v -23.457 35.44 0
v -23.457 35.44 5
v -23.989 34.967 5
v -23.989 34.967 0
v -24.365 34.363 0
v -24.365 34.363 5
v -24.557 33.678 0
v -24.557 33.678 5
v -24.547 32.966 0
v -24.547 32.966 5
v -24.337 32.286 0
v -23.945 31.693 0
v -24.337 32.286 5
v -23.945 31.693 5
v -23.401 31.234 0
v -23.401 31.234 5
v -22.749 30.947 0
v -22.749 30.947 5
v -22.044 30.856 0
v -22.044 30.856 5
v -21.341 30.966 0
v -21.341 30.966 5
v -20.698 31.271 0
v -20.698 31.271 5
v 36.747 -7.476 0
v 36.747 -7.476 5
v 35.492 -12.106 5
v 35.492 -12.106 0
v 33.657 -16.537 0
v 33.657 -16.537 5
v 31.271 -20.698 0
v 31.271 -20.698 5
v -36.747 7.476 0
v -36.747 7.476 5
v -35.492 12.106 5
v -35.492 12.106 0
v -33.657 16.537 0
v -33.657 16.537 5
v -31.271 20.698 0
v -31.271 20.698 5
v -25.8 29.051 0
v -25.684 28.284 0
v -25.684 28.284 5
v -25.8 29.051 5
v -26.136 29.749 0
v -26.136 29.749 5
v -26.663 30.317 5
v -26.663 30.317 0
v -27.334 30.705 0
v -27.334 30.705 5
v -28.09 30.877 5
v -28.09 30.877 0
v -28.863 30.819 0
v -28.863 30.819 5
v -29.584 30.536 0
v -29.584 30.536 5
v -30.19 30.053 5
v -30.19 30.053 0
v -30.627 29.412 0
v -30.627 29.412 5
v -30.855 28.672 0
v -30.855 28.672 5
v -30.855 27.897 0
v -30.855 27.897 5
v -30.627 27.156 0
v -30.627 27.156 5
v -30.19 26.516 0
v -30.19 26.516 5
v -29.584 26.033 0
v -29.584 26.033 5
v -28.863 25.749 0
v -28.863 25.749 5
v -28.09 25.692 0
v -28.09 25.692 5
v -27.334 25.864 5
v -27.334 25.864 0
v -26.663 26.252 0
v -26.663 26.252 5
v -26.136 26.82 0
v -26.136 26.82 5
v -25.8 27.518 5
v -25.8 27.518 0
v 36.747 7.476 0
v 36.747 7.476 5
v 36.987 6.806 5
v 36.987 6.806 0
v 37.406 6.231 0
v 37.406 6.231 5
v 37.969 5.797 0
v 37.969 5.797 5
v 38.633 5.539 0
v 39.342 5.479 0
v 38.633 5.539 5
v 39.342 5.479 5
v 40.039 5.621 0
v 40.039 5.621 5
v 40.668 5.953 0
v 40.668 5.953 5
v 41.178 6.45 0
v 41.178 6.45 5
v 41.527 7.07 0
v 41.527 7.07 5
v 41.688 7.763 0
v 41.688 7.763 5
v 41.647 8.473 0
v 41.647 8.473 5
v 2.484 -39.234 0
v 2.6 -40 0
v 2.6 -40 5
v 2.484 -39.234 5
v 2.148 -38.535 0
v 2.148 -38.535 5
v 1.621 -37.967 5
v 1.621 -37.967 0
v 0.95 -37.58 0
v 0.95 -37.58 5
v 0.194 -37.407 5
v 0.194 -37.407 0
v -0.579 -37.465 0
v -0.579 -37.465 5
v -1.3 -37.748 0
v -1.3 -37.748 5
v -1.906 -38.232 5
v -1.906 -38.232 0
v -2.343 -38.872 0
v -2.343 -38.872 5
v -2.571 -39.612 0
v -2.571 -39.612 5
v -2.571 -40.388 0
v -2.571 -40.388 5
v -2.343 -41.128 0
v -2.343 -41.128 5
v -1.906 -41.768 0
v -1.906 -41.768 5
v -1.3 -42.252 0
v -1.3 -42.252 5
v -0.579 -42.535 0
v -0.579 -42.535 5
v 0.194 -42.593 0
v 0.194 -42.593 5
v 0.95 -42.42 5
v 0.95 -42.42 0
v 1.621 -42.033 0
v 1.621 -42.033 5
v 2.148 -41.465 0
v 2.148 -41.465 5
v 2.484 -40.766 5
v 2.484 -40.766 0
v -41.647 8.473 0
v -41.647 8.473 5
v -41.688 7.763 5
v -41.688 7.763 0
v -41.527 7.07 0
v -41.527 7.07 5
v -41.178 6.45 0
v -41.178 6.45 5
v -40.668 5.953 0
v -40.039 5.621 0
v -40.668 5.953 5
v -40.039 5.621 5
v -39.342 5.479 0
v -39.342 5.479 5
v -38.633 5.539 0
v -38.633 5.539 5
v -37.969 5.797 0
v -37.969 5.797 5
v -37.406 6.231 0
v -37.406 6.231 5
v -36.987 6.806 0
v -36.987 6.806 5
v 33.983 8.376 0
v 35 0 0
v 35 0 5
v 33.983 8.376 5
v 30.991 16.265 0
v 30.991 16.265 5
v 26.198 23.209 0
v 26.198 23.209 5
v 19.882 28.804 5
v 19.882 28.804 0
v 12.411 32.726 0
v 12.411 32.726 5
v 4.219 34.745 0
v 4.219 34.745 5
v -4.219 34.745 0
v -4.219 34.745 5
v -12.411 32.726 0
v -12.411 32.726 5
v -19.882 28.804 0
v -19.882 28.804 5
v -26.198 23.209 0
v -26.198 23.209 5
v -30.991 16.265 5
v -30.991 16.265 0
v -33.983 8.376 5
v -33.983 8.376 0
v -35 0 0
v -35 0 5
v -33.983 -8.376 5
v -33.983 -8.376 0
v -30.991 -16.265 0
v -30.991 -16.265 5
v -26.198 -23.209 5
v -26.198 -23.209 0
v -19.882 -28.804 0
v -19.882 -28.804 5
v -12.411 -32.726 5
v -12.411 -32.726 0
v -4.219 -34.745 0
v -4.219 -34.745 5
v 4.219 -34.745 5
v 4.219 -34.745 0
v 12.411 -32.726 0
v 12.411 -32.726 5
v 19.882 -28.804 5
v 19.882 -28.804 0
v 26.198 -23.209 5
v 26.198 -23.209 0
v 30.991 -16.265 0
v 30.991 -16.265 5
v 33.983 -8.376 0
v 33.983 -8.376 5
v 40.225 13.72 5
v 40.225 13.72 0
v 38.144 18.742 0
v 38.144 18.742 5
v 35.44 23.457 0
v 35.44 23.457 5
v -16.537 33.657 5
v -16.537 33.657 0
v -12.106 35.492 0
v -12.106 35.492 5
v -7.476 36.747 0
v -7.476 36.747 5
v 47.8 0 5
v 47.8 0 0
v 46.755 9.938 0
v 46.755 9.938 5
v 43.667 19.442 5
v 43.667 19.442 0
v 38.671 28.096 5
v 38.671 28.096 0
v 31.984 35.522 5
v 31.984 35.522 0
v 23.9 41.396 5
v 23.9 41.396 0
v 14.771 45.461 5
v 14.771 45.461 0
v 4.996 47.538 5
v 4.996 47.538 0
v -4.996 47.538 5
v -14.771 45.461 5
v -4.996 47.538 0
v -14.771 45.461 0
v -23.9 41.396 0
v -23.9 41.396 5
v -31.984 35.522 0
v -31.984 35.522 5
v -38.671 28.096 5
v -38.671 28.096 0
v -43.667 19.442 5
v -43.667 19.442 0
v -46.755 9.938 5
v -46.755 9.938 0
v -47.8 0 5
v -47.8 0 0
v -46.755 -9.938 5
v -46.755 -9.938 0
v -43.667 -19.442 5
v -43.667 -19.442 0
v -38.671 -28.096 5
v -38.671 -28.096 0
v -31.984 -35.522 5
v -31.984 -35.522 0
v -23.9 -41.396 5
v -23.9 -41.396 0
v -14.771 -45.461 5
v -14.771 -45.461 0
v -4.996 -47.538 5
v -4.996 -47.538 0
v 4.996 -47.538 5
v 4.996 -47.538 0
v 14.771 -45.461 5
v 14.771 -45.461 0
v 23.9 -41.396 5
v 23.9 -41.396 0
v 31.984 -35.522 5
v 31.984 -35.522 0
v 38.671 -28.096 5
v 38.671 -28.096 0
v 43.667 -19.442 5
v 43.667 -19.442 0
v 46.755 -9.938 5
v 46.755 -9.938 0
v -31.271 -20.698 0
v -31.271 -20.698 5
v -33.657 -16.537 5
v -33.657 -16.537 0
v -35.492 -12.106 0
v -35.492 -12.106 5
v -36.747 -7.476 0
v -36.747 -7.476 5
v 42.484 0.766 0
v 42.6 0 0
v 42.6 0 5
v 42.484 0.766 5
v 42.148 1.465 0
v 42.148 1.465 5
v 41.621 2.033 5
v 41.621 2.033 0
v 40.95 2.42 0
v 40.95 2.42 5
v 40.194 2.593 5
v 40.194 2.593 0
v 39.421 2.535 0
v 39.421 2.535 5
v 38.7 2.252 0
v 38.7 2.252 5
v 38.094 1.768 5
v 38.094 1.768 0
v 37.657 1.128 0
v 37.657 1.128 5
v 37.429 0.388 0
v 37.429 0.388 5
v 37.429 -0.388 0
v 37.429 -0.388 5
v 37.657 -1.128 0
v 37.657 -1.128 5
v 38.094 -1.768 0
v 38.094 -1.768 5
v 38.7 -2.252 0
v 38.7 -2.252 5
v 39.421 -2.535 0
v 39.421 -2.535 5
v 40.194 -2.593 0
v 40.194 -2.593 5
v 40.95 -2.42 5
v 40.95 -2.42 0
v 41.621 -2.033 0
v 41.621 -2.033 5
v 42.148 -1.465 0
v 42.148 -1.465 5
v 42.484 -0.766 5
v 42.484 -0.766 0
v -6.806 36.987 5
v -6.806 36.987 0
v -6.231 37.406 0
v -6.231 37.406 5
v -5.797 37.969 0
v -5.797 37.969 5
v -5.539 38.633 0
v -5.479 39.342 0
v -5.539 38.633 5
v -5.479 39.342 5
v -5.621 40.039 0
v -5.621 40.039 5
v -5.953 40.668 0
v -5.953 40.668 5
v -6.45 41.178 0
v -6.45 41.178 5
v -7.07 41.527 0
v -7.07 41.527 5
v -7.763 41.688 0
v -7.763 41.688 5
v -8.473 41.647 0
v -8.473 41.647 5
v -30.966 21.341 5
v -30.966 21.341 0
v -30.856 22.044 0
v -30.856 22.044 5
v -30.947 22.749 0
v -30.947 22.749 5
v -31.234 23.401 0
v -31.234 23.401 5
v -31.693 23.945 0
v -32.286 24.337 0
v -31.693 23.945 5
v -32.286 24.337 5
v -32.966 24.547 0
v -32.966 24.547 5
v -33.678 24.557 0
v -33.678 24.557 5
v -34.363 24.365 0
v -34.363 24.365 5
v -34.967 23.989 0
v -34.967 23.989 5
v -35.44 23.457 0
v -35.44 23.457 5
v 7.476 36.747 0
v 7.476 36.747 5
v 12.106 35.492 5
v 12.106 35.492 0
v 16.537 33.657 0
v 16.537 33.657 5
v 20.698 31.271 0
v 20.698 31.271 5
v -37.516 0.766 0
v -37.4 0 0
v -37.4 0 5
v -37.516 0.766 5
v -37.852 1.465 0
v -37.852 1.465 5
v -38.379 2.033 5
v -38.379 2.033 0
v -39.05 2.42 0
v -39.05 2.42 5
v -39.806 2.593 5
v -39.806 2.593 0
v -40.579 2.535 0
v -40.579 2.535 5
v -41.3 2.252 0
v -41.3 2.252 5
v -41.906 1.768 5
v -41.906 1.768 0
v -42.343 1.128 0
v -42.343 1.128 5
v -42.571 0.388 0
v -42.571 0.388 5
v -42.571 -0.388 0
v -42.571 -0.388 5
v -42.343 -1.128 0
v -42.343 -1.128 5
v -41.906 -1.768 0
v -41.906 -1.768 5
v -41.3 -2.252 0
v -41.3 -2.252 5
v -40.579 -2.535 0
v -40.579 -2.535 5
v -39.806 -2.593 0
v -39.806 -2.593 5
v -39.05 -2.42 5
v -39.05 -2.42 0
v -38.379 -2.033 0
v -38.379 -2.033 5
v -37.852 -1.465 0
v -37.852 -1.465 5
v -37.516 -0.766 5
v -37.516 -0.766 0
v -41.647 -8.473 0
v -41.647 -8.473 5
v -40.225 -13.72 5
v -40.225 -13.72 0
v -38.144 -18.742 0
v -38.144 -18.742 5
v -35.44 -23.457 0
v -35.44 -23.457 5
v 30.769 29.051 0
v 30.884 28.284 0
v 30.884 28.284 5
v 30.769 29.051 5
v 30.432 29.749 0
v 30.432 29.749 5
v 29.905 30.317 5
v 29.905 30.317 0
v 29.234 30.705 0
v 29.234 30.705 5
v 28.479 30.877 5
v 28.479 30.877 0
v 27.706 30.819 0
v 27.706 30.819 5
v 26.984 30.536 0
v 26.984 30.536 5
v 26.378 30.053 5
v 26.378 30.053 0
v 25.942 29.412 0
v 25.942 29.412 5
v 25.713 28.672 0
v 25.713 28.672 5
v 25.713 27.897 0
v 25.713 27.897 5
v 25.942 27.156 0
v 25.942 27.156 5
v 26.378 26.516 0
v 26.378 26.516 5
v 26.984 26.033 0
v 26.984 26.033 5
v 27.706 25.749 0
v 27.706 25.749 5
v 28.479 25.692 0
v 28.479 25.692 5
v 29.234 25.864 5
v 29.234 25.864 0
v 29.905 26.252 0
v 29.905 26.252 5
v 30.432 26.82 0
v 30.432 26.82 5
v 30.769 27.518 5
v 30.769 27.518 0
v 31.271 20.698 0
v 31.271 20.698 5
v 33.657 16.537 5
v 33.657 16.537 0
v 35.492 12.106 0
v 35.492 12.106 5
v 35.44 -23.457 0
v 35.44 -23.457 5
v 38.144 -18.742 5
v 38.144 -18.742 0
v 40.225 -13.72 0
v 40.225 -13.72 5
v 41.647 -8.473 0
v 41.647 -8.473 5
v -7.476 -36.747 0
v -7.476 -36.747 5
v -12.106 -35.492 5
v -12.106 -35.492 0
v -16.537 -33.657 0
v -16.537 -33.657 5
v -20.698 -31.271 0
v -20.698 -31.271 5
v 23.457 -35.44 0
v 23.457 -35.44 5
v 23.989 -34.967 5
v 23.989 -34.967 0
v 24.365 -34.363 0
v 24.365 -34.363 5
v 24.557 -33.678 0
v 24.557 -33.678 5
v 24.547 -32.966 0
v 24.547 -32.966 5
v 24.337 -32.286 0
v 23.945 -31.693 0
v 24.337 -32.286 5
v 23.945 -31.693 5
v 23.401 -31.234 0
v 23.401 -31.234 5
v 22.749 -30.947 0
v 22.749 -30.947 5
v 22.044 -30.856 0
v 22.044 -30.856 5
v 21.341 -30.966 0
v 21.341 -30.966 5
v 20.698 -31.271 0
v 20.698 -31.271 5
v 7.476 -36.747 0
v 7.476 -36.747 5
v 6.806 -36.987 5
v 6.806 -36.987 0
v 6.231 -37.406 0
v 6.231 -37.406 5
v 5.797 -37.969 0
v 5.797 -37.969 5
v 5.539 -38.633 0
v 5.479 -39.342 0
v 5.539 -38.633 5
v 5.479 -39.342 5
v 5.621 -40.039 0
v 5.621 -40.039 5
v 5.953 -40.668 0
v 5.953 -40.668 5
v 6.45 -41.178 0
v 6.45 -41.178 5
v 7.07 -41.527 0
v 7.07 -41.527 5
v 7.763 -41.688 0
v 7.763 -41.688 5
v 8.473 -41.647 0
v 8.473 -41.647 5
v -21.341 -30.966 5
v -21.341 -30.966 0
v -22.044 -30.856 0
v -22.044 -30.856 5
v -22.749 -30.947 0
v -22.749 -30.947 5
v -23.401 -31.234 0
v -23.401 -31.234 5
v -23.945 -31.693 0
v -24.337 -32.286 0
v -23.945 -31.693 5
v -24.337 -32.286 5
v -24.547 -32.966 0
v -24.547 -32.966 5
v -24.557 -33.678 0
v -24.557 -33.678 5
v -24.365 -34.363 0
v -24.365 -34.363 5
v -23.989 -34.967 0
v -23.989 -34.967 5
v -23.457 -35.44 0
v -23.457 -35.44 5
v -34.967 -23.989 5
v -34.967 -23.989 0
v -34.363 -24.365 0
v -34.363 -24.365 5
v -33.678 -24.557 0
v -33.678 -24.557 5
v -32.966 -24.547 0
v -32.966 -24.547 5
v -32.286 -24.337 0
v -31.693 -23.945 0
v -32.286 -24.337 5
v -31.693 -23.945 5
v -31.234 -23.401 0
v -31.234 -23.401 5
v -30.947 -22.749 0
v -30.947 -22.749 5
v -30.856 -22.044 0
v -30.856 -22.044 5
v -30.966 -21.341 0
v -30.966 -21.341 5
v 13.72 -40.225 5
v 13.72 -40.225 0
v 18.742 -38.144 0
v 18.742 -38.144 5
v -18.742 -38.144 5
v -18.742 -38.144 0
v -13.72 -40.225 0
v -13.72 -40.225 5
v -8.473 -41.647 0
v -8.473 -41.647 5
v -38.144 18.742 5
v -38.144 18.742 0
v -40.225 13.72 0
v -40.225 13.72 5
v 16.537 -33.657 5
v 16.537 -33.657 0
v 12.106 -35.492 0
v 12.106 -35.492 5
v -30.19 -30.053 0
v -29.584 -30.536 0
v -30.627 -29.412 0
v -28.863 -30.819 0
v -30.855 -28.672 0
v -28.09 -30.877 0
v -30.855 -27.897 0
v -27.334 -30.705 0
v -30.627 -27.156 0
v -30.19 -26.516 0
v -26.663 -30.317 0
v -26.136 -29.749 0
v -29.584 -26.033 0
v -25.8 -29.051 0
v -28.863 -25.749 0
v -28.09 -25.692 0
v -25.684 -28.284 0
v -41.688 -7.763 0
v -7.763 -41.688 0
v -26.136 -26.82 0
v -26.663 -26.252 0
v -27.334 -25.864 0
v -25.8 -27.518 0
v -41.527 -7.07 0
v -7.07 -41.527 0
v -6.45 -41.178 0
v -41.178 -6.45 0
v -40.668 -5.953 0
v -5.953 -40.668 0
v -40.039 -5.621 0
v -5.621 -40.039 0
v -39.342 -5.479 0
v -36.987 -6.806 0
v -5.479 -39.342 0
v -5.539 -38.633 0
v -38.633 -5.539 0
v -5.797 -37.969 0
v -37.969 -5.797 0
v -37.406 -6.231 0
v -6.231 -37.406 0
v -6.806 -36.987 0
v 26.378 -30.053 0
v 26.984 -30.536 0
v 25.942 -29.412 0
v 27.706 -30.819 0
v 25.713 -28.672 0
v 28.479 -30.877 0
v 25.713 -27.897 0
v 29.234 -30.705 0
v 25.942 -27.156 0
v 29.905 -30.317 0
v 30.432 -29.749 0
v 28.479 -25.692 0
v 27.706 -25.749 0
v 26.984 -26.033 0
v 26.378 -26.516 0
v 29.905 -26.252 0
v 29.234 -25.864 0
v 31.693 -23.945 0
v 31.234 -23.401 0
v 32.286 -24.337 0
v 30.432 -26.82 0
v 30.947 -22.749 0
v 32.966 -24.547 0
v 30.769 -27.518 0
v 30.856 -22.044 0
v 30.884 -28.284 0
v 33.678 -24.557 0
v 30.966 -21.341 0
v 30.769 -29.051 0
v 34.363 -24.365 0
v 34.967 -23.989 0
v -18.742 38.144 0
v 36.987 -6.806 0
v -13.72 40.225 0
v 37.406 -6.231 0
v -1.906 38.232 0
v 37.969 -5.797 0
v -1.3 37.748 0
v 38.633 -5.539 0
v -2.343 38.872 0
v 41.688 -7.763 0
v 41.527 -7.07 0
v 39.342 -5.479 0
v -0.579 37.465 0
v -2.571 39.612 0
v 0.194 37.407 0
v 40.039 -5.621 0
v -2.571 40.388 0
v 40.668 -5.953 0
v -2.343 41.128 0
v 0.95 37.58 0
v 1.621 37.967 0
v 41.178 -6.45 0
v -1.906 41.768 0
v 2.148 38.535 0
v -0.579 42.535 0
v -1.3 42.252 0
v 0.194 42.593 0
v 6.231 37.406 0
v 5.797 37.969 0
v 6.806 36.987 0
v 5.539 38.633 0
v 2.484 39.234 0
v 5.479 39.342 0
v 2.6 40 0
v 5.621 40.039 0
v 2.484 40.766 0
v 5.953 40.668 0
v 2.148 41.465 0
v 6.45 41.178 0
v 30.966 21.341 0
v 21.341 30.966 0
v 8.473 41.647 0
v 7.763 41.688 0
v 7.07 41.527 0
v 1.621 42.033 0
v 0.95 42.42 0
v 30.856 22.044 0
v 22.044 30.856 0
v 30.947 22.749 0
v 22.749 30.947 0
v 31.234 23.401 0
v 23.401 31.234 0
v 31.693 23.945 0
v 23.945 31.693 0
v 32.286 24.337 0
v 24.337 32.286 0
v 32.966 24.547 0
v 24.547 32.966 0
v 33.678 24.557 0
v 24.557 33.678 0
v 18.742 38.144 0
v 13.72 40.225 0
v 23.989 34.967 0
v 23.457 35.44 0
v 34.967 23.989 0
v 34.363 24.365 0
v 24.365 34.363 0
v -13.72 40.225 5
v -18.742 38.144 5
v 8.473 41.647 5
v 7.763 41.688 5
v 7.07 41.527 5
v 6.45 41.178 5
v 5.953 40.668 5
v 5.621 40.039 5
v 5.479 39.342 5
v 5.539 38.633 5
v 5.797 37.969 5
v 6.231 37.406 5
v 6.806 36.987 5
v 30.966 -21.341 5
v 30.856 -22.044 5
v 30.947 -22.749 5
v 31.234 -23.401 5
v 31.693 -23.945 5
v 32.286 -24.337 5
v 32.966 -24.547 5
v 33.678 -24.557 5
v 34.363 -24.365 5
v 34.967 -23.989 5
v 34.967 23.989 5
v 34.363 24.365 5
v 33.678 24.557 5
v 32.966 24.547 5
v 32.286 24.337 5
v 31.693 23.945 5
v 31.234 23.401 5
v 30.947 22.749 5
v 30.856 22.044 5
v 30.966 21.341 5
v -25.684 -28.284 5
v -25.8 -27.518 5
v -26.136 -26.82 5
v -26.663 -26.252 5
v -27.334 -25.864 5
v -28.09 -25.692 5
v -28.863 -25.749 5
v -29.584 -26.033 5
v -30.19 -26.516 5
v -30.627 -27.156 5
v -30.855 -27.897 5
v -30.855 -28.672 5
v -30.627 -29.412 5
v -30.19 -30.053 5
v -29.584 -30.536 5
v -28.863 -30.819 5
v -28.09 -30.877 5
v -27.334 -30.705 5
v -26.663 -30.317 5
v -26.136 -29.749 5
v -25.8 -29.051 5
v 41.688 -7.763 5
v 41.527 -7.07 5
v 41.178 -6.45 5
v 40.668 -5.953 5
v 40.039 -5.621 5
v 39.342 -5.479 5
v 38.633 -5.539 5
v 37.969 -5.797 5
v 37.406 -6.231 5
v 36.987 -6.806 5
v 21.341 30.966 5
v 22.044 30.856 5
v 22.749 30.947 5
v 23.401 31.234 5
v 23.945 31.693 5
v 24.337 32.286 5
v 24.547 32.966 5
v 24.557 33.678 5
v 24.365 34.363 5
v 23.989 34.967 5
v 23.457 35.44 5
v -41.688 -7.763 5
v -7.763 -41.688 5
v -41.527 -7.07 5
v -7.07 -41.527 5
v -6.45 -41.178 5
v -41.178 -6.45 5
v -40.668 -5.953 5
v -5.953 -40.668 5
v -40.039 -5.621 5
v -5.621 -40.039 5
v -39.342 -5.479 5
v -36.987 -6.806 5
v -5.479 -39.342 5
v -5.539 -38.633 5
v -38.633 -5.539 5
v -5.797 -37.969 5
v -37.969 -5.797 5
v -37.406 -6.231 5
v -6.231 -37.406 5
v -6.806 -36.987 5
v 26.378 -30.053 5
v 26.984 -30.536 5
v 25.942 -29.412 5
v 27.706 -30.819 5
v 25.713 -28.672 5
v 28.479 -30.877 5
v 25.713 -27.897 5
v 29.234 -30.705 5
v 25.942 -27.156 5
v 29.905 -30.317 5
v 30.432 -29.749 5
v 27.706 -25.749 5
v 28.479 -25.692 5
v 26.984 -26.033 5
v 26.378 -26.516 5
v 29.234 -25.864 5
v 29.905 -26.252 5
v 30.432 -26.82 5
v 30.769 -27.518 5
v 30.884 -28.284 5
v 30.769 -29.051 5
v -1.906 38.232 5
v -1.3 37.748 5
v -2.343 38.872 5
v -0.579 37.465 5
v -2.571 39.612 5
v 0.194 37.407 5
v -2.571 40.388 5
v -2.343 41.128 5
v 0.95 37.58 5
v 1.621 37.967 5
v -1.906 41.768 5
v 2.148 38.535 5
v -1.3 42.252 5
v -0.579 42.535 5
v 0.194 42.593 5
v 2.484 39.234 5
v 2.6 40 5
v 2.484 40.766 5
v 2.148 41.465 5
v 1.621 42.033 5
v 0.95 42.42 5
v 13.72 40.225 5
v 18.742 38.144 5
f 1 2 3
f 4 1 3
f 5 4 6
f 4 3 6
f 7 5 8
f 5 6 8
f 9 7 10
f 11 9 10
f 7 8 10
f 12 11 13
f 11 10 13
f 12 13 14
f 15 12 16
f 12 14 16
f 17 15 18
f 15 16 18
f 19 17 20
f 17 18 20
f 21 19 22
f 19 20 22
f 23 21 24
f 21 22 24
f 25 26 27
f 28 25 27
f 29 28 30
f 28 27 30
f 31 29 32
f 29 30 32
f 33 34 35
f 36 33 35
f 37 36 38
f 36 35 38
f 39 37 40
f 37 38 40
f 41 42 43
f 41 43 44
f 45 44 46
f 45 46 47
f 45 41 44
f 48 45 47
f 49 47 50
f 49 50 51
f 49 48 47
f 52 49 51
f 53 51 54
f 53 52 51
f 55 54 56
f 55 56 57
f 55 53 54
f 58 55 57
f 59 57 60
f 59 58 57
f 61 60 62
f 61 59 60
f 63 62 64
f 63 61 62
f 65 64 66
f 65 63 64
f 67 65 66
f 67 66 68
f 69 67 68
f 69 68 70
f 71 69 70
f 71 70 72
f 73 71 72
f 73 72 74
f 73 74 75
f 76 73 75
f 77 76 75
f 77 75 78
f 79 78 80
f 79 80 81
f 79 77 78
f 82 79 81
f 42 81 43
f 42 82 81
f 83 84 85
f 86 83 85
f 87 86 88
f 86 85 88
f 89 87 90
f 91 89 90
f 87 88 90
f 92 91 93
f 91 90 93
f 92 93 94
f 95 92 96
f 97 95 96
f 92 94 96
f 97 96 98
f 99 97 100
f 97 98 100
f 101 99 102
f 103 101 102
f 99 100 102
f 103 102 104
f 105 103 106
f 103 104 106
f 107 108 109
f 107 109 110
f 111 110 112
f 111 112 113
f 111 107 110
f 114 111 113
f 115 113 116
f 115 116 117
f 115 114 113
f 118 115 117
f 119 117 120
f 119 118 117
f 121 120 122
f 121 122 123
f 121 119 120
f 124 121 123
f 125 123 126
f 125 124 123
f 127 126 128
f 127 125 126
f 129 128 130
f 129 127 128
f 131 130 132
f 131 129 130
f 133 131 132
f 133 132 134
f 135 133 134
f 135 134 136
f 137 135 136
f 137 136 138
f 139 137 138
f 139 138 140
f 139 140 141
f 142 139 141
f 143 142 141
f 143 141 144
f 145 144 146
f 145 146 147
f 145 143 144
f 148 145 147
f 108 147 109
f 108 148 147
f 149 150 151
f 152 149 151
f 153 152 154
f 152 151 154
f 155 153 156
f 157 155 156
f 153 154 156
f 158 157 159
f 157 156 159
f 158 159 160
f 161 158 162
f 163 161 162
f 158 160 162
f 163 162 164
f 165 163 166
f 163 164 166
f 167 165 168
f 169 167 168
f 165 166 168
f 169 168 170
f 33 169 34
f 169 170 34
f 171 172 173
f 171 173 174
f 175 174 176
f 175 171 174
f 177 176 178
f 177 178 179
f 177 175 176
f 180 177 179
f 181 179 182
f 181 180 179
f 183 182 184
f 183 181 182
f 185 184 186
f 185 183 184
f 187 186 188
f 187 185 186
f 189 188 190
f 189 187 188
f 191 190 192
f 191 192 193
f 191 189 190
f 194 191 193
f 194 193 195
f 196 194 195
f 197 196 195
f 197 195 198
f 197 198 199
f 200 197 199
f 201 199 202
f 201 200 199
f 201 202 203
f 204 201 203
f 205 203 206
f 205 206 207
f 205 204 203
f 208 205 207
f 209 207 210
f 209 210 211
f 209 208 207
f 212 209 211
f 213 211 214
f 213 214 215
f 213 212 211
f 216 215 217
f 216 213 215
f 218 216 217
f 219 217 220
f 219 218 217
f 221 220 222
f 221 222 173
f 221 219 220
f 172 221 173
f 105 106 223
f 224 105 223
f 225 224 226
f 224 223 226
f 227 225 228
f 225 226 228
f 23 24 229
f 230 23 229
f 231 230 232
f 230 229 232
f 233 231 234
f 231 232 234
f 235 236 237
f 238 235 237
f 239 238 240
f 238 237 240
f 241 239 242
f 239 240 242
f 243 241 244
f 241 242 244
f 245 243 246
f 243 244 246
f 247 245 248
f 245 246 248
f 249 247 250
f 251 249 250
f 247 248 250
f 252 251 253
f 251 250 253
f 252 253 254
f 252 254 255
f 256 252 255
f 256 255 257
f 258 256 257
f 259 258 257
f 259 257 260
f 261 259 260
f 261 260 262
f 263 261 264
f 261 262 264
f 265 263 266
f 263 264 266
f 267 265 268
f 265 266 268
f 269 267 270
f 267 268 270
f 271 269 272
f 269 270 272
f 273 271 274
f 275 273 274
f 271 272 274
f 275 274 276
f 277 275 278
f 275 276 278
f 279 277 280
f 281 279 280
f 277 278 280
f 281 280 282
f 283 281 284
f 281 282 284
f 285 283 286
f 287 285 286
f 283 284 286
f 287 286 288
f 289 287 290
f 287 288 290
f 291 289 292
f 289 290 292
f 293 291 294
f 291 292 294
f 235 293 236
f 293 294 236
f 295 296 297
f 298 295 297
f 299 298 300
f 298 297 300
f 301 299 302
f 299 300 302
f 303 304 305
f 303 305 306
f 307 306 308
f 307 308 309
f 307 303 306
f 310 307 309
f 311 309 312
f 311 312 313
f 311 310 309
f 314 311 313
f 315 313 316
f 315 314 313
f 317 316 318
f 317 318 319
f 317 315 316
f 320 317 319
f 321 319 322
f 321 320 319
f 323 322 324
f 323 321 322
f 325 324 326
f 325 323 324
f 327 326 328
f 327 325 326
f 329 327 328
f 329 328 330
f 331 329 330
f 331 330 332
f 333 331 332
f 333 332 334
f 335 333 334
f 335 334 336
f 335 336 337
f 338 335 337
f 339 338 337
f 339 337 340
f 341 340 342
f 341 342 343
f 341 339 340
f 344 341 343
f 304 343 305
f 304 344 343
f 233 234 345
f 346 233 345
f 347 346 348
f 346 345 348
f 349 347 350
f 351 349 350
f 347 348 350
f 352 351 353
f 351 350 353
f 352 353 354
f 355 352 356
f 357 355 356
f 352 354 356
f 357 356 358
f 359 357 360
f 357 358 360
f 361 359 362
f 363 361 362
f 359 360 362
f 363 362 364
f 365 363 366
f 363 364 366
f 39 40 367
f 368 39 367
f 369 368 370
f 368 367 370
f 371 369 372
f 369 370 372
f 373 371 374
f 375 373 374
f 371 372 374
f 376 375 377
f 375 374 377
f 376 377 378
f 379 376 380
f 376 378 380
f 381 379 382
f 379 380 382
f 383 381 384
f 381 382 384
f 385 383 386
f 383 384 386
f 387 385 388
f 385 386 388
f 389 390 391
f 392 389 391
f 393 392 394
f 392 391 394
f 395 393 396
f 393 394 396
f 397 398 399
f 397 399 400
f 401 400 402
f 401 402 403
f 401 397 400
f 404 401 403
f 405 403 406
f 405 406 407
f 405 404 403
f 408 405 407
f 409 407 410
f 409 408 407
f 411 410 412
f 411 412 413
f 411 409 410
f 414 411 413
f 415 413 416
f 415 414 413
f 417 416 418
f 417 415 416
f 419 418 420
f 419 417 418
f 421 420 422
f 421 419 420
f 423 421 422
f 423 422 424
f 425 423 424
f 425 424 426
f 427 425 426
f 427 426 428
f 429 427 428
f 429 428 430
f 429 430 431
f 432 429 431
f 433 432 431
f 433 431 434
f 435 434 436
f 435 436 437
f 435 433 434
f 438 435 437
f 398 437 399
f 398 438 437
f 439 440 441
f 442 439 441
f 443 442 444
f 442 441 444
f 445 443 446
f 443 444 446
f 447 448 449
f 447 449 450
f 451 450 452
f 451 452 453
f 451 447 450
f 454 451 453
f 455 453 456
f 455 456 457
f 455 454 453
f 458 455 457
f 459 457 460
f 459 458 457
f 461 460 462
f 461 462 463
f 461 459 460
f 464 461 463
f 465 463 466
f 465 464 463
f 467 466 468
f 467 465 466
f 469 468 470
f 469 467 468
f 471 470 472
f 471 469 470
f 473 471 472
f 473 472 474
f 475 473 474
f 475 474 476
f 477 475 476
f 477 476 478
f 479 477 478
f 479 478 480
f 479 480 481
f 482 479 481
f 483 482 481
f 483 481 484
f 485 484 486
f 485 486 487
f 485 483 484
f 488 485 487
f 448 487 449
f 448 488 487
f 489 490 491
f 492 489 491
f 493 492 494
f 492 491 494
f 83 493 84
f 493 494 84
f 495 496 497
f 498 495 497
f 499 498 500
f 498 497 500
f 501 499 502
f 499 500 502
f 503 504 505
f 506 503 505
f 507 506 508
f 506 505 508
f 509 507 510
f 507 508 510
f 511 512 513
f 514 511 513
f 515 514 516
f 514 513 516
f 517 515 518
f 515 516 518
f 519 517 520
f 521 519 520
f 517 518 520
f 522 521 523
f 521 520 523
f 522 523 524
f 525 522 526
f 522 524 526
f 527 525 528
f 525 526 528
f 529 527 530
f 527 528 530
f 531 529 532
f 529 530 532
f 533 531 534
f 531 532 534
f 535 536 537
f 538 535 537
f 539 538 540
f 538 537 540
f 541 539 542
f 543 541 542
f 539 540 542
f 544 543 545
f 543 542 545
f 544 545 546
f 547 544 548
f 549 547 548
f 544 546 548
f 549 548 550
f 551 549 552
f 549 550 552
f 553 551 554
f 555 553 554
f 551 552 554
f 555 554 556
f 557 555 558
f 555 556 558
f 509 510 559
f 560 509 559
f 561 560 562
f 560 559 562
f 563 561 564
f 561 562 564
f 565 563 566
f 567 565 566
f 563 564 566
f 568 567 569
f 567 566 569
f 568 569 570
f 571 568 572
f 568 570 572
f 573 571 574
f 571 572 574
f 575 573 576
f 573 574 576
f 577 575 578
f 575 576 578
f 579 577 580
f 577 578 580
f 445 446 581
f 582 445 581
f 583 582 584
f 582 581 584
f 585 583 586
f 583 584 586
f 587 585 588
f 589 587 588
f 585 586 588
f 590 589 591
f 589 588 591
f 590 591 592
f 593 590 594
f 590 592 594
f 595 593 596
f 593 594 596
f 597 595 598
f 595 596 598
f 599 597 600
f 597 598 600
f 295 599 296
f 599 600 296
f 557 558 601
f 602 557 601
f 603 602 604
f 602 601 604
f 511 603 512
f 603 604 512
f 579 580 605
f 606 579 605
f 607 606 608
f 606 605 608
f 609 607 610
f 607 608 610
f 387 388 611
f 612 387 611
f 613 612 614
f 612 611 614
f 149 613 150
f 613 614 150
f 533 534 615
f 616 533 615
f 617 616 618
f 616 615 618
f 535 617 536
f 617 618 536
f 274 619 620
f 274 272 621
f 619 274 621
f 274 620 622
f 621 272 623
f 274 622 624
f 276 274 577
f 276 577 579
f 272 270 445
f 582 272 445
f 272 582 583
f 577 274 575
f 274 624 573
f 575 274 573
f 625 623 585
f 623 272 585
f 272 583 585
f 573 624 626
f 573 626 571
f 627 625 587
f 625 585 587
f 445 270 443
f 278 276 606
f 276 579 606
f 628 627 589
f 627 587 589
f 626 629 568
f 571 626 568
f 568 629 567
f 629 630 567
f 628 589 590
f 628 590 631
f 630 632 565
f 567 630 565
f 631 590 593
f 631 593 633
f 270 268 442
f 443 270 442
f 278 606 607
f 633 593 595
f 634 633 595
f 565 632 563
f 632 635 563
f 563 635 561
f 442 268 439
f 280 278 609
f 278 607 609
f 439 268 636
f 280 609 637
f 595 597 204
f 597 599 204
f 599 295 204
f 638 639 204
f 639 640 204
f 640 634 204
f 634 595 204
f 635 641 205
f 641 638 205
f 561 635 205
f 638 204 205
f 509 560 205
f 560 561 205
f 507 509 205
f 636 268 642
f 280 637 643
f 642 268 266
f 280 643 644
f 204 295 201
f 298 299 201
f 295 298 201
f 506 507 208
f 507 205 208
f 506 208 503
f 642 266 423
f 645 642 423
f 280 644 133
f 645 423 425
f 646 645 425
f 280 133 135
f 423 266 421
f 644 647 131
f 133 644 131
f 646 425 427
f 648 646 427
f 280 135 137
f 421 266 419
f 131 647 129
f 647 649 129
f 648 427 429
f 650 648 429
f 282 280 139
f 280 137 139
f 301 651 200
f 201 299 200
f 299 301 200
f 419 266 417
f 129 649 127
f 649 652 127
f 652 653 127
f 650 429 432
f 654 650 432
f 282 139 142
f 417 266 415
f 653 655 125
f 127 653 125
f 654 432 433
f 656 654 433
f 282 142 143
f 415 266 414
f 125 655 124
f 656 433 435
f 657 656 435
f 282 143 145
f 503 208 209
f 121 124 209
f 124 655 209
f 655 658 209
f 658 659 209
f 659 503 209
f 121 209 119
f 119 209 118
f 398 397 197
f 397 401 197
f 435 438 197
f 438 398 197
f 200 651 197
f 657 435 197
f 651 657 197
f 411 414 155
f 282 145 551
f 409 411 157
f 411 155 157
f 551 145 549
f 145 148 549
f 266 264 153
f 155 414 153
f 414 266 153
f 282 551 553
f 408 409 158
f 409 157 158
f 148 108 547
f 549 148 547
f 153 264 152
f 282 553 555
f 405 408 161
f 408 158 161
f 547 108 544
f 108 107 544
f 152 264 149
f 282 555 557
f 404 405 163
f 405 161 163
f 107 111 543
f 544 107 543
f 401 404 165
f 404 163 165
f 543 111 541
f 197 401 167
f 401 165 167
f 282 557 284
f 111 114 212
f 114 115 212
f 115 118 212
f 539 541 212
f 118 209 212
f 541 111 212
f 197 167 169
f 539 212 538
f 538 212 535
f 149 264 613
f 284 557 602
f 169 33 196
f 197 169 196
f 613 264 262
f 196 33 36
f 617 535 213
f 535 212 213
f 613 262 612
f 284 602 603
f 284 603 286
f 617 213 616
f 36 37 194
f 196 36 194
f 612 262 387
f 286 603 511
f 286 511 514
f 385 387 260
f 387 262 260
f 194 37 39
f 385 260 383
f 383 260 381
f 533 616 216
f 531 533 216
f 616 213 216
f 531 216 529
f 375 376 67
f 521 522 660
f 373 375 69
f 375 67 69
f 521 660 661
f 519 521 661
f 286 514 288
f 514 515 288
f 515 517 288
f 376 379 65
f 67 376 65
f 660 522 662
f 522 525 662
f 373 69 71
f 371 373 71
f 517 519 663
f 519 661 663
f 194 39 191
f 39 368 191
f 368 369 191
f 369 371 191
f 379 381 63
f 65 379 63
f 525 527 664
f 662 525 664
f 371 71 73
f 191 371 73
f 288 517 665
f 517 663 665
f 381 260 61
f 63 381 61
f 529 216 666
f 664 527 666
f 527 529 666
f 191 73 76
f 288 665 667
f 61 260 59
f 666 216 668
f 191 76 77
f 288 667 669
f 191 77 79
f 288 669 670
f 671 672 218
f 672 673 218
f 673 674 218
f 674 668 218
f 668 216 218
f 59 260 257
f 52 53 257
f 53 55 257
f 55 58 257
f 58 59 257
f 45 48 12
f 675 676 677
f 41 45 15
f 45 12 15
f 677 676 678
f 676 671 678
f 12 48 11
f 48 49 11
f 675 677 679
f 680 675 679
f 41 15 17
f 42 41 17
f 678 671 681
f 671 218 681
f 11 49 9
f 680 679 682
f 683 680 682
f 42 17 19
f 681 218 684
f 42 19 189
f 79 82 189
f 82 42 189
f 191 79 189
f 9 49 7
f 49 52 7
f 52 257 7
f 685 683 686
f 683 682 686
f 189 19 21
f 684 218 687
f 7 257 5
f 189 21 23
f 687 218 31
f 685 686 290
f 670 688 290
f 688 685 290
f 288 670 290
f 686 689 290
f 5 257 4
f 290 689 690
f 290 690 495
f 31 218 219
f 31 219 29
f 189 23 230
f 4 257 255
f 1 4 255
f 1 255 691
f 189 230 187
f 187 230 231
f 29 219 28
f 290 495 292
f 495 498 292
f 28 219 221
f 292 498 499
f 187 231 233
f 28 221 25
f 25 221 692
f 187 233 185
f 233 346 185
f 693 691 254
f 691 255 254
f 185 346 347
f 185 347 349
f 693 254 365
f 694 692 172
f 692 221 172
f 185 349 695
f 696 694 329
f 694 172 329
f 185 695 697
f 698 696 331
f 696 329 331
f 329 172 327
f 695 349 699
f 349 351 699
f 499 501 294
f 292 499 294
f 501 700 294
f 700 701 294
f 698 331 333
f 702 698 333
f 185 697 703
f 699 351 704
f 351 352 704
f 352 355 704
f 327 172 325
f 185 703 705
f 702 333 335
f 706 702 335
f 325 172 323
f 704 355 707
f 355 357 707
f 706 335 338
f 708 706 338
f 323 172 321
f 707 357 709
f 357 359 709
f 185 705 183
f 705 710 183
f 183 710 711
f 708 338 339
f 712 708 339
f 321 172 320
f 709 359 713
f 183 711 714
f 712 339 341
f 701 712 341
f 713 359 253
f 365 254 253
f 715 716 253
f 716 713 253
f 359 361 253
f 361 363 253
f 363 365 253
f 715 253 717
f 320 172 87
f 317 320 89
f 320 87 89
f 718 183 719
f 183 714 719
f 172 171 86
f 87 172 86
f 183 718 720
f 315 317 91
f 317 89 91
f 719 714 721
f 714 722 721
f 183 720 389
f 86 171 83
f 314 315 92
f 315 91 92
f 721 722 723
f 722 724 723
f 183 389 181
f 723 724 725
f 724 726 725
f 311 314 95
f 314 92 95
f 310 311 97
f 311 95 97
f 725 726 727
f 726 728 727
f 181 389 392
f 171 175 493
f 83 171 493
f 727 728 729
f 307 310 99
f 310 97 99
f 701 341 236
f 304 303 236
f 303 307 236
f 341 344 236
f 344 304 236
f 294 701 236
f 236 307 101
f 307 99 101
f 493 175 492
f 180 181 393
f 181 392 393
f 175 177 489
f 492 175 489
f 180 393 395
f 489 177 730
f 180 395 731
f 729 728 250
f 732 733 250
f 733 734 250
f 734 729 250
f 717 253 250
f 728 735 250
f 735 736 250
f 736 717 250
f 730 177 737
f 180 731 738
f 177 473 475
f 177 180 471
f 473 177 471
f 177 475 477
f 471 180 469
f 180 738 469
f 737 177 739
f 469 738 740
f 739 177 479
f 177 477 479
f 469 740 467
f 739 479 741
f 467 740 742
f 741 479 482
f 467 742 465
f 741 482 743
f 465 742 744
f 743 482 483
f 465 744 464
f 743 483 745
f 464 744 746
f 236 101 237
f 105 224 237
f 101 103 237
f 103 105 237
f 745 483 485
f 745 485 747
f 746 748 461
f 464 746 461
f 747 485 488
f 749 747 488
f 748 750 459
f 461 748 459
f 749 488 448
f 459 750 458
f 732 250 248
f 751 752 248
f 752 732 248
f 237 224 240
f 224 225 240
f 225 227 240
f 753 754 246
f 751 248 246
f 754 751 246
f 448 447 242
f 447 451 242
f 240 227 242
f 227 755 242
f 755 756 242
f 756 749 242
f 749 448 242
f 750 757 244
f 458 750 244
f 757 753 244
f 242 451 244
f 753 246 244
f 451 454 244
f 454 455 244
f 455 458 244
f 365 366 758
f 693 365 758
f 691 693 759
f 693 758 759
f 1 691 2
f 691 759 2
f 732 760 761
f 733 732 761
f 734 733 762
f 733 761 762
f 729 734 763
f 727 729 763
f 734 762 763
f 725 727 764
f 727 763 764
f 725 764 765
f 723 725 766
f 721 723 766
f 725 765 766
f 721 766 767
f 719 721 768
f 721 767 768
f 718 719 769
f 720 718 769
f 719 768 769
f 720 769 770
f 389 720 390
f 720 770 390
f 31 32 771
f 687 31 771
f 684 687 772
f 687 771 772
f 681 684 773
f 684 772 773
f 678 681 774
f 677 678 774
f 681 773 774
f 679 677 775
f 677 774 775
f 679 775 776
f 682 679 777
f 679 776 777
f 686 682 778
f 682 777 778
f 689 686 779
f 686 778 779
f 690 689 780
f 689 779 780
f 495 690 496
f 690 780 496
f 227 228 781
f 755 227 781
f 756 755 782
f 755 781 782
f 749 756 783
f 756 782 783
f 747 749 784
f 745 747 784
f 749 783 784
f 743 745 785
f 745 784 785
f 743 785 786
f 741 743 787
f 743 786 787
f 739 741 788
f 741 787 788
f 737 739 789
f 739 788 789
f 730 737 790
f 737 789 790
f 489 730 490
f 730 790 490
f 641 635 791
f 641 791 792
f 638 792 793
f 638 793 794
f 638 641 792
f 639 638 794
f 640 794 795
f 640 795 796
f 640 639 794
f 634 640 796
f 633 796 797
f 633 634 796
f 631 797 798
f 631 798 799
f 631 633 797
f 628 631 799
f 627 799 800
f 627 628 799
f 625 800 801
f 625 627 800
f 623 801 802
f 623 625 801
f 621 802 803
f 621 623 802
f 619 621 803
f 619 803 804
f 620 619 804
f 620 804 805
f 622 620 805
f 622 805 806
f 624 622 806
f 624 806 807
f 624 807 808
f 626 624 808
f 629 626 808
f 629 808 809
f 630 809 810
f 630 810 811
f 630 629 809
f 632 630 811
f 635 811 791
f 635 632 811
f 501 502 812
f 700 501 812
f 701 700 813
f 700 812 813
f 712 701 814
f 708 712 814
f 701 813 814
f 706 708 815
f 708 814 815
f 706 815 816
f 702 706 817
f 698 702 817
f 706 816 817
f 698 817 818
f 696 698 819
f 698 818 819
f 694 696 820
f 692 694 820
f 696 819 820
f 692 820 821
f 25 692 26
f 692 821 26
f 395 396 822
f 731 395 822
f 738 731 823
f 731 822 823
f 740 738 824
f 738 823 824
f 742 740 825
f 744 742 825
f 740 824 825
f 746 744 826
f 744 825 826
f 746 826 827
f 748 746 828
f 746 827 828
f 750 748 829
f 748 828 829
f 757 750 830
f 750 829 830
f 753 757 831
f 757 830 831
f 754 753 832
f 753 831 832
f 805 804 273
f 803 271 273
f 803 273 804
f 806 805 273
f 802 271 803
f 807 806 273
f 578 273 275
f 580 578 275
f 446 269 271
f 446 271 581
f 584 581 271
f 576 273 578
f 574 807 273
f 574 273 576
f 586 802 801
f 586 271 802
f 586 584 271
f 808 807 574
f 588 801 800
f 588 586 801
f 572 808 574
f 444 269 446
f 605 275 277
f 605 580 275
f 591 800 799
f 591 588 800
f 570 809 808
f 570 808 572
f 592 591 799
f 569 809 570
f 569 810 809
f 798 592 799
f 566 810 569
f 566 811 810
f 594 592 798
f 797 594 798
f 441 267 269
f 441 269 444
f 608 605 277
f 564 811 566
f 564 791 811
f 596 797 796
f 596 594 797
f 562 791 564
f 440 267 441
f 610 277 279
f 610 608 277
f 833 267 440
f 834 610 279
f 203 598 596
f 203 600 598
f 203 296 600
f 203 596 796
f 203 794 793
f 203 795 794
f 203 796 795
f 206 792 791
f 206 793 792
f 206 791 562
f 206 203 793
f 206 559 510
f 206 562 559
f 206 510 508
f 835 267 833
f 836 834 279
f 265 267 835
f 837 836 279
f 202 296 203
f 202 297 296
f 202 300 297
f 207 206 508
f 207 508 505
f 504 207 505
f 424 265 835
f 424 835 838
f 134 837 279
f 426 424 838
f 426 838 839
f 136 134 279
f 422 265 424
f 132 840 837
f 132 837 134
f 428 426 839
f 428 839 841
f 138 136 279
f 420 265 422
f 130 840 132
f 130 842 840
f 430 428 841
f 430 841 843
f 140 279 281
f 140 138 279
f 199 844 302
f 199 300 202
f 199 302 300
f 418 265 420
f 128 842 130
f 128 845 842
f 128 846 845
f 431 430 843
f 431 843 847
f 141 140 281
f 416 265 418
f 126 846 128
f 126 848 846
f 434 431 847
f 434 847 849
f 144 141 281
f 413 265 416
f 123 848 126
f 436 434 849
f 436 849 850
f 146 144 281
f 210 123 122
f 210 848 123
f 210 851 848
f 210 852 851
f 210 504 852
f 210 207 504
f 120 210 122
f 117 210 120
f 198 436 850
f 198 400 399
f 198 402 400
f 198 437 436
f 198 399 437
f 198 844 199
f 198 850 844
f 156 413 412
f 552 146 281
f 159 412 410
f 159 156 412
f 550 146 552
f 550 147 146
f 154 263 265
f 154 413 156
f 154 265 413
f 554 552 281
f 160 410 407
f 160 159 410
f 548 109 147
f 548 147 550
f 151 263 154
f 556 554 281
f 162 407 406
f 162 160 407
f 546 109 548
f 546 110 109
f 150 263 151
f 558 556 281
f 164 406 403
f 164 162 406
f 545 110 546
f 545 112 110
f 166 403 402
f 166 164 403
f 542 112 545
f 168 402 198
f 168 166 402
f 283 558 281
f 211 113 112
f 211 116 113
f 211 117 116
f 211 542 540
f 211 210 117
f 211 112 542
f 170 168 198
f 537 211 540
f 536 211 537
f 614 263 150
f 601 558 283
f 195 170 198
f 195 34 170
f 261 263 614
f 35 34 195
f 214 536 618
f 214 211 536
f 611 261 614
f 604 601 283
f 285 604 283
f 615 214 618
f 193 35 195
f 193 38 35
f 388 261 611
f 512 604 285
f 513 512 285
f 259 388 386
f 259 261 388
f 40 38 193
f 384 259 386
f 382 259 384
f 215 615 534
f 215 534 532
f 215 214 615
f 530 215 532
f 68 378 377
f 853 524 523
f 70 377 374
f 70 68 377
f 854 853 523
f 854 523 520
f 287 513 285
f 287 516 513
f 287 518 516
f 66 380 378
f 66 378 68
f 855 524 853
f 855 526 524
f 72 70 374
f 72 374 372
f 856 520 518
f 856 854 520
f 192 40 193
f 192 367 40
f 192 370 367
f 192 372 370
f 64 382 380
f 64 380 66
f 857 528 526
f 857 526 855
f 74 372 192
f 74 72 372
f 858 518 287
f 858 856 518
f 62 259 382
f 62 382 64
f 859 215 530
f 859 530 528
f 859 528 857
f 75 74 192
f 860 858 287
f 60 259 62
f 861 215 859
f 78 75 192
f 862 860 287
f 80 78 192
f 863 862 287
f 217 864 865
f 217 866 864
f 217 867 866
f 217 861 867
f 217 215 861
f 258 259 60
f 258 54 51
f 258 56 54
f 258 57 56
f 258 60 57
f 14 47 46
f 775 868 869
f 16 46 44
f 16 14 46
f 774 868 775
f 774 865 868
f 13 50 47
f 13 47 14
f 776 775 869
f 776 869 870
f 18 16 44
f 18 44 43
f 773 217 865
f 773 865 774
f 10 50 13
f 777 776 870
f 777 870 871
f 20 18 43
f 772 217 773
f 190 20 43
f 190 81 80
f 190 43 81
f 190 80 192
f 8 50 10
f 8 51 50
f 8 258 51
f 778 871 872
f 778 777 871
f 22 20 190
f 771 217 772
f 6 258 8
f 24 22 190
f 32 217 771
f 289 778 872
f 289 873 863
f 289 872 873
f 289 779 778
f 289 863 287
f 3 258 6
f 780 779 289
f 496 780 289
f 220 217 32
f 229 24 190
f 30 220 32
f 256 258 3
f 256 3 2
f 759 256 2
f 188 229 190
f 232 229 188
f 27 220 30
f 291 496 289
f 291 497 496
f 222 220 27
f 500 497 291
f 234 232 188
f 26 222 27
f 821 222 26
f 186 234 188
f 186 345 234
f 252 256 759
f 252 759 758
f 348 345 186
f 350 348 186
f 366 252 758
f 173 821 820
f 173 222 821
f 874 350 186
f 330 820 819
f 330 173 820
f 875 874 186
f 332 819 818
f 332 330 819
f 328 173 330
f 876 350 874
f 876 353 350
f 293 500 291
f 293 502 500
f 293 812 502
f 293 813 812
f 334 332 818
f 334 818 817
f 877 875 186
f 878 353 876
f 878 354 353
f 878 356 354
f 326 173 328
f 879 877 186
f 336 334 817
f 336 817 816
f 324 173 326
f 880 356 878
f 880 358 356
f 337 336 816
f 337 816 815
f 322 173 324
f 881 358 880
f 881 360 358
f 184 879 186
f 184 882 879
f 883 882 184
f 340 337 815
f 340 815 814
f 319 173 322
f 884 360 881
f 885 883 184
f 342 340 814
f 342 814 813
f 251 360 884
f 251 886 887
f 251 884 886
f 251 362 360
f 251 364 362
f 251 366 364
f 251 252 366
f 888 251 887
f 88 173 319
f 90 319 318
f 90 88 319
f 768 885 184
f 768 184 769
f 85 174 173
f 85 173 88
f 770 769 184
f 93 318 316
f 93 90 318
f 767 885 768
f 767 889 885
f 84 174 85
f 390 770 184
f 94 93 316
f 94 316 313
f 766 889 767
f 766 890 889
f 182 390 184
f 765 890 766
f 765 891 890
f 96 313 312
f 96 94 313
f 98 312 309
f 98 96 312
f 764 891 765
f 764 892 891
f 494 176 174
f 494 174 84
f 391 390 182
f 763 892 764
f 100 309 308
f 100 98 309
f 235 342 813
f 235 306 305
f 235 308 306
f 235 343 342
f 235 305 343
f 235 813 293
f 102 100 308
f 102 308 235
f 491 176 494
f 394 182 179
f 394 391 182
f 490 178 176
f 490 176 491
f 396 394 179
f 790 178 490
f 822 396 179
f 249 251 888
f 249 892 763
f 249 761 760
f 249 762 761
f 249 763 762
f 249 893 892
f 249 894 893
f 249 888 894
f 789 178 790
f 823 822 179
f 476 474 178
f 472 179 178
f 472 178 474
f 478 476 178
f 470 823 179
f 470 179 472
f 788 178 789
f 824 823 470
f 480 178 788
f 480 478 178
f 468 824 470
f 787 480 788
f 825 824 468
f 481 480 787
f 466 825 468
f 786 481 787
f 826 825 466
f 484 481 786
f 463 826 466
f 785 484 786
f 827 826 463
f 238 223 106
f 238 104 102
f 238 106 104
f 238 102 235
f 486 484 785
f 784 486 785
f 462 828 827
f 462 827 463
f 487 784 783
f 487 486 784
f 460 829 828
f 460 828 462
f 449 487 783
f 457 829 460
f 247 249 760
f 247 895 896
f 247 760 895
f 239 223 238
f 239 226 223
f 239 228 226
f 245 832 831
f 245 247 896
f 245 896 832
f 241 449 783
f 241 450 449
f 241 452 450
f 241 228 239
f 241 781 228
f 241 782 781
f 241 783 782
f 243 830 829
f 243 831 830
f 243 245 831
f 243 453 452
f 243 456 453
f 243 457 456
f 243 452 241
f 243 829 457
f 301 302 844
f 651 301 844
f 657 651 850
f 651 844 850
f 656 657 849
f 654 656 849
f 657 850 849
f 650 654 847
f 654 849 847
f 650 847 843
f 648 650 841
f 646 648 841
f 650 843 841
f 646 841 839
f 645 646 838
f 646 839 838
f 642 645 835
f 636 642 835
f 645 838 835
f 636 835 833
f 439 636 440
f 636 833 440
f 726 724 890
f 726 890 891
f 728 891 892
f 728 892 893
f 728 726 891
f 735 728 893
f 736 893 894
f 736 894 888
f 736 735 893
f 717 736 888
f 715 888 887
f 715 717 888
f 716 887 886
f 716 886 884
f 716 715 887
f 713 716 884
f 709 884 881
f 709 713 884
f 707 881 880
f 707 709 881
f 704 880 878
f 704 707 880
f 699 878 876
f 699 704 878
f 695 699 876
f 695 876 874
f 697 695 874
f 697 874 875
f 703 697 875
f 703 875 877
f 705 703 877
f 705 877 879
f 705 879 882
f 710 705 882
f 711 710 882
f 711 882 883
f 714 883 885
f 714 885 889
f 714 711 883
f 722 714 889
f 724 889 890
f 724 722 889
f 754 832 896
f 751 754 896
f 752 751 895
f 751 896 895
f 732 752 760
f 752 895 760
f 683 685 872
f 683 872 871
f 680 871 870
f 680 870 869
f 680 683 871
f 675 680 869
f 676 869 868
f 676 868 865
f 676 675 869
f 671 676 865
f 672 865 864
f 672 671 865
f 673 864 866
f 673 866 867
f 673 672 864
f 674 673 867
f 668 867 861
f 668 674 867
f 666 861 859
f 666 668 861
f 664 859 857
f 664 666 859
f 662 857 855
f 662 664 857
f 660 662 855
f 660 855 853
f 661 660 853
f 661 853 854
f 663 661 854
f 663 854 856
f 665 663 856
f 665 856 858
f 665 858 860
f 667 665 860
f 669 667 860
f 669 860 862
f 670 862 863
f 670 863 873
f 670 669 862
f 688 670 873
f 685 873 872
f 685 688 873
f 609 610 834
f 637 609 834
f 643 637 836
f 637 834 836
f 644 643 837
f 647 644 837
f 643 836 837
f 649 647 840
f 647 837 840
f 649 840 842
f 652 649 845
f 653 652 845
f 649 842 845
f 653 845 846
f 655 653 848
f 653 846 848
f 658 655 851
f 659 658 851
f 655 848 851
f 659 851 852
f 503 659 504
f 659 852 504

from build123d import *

# Parameters (mm, degrees)
SKETCH_1_R          = 45
SKETCH_1_R_2        = 2.6
SKETCH_1_R_3        = 35
EXTRUDE_2_DEPTH     = 5
EXTRUDE_START       = -5
SKETCH_3_R          = 47.8
SKETCH_3_R_2        = 45
EXTRUDE_3_DEPTH     = 5
CUT_EXTRUDE_1_DEPTH = 10


with BuildPart() as part:
    # 草图1 → 凸台-拉伸2 (new body)
    with BuildSketch(Plane.XY):
        Circle(SKETCH_1_R)
        with Locations((0, 40)):
            Circle(SKETCH_1_R_2, mode=Mode.SUBTRACT)
        with Locations((28.284271247, 28.284271247)):
            Circle(SKETCH_1_R_2, mode=Mode.SUBTRACT)
        with Locations((40, 0)):
            Circle(SKETCH_1_R_2, mode=Mode.SUBTRACT)
        with Locations((28.284271247, -28.284271247)):
            Circle(SKETCH_1_R_2, mode=Mode.SUBTRACT)
        with Locations((0, -40)):
            Circle(SKETCH_1_R_2, mode=Mode.SUBTRACT)
        with Locations((-28.284271247, -28.284271247)):
            Circle(SKETCH_1_R_2, mode=Mode.SUBTRACT)
        Circle(SKETCH_1_R_3, mode=Mode.SUBTRACT)
        with Locations((-40, 0)):
            Circle(SKETCH_1_R_2, mode=Mode.SUBTRACT)
        with Locations((-28.284271247, 28.284271247)):
            Circle(SKETCH_1_R_2, mode=Mode.SUBTRACT)
    extrude(amount=EXTRUDE_2_DEPTH)

    # 草图3 → 凸台-拉伸3 (add)
    with BuildSketch(Plane.XY.offset(5).offset(EXTRUDE_START)):
        Circle(SKETCH_3_R)
        Circle(SKETCH_3_R_2, mode=Mode.SUBTRACT)
    extrude(amount=EXTRUDE_3_DEPTH)

    # 草图4 → 切除-拉伸1 (cut)
    with BuildSketch(Plane.XY.offset(5)):
        with BuildLine():
            ThreePointArc((-8.473137213, 41.646799946), (-16.264045876, 39.264880132), (-23.457321876, 35.440147438))
            ThreePointArc((-23.457321876, 35.440147438), (-24.162193968, 31.975590419), (-20.697636949, 31.270718328))
            ThreePointArc((-20.697636949, 31.270718328), (-14.350628714, 34.645482469), (-7.476297541, 36.747176423))
            ThreePointArc((-7.476297541, 36.747176423), (-5.524905615, 39.695408021), (-8.473137213, 41.646799946))
        make_face()
        with BuildLine():
            ThreePointArc((23.457321876, 35.440147438), (16.264045876, 39.264880132), (8.473137213, 41.646799946))
            ThreePointArc((8.473137213, 41.646799946), (5.524905615, 39.695408021), (7.476297541, 36.747176423))
            ThreePointArc((7.476297541, 36.747176423), (14.350628714, 34.645482469), (20.697636949, 31.270718328))
            ThreePointArc((20.697636949, 31.270718328), (24.162193968, 31.975590419), (23.457321876, 35.440147438))
        make_face()
        with BuildLine():
            ThreePointArc((41.646799946, 8.473137213), (39.264880132, 16.264045876), (35.440147438, 23.457321876))
            ThreePointArc((35.440147438, 23.457321876), (31.975590419, 24.162193968), (31.270718328, 20.697636949))
            ThreePointArc((31.270718328, 20.697636949), (34.645482469, 14.350628714), (36.747176423, 7.476297541))
            ThreePointArc((36.747176423, 7.476297541), (39.695408021, 5.524905615), (41.646799946, 8.473137213))
        make_face()
        with BuildLine():
            ThreePointArc((35.440147438, -23.457321876), (39.264880132, -16.264045876), (41.646799946, -8.473137213))
            ThreePointArc((41.646799946, -8.473137213), (39.695408021, -5.524905615), (36.747176423, -7.476297541))
            ThreePointArc((36.747176423, -7.476297541), (34.645482469, -14.350628714), (31.270718328, -20.697636949))
            ThreePointArc((31.270718328, -20.697636949), (31.975590419, -24.162193968), (35.440147438, -23.457321876))
        make_face()
        with BuildLine():
            ThreePointArc((8.473137213, -41.646799946), (16.264045876, -39.264880132), (23.457321876, -35.440147438))
            ThreePointArc((23.457321876, -35.440147438), (24.162193968, -31.975590419), (20.697636949, -31.270718328))
            ThreePointArc((20.697636949, -31.270718328), (14.350628714, -34.645482469), (7.476297541, -36.747176423))
            ThreePointArc((7.476297541, -36.747176423), (5.524905615, -39.695408021), (8.473137213, -41.646799946))
        make_face()
        with BuildLine():
            ThreePointArc((-23.457321876, -35.440147438), (-16.264045876, -39.264880132), (-8.473137213, -41.646799946))
            ThreePointArc((-8.473137213, -41.646799946), (-5.524905615, -39.695408021), (-7.476297541, -36.747176423))
            ThreePointArc((-7.476297541, -36.747176423), (-14.350628714, -34.645482469), (-20.697636949, -31.270718328))
            ThreePointArc((-20.697636949, -31.270718328), (-24.162193968, -31.975590419), (-23.457321876, -35.440147438))
        make_face()
        with BuildLine():
            ThreePointArc((-41.646799946, -8.473137213), (-39.264880132, -16.264045876), (-35.440147438, -23.457321876))
            ThreePointArc((-35.440147438, -23.457321876), (-31.975590419, -24.162193968), (-31.270718328, -20.697636949))
            ThreePointArc((-31.270718328, -20.697636949), (-34.645482469, -14.350628714), (-36.747176423, -7.476297541))
            ThreePointArc((-36.747176423, -7.476297541), (-39.695408021, -5.524905615), (-41.646799946, -8.473137213))
        make_face()
        with BuildLine():
            ThreePointArc((-35.440147438, 23.457321876), (-39.264880132, 16.264045876), (-41.646799946, 8.473137213))
            ThreePointArc((-41.646799946, 8.473137213), (-39.695408021, 5.524905615), (-36.747176423, 7.476297541))
            ThreePointArc((-36.747176423, 7.476297541), (-34.645482469, 14.350628714), (-31.270718328, 20.697636949))
            ThreePointArc((-31.270718328, 20.697636949), (-31.975590419, 24.162193968), (-35.440147438, 23.457321876))
        make_face()
    extrude(amount=-CUT_EXTRUDE_1_DEPTH, mode=Mode.SUBTRACT)


solid = part.part
